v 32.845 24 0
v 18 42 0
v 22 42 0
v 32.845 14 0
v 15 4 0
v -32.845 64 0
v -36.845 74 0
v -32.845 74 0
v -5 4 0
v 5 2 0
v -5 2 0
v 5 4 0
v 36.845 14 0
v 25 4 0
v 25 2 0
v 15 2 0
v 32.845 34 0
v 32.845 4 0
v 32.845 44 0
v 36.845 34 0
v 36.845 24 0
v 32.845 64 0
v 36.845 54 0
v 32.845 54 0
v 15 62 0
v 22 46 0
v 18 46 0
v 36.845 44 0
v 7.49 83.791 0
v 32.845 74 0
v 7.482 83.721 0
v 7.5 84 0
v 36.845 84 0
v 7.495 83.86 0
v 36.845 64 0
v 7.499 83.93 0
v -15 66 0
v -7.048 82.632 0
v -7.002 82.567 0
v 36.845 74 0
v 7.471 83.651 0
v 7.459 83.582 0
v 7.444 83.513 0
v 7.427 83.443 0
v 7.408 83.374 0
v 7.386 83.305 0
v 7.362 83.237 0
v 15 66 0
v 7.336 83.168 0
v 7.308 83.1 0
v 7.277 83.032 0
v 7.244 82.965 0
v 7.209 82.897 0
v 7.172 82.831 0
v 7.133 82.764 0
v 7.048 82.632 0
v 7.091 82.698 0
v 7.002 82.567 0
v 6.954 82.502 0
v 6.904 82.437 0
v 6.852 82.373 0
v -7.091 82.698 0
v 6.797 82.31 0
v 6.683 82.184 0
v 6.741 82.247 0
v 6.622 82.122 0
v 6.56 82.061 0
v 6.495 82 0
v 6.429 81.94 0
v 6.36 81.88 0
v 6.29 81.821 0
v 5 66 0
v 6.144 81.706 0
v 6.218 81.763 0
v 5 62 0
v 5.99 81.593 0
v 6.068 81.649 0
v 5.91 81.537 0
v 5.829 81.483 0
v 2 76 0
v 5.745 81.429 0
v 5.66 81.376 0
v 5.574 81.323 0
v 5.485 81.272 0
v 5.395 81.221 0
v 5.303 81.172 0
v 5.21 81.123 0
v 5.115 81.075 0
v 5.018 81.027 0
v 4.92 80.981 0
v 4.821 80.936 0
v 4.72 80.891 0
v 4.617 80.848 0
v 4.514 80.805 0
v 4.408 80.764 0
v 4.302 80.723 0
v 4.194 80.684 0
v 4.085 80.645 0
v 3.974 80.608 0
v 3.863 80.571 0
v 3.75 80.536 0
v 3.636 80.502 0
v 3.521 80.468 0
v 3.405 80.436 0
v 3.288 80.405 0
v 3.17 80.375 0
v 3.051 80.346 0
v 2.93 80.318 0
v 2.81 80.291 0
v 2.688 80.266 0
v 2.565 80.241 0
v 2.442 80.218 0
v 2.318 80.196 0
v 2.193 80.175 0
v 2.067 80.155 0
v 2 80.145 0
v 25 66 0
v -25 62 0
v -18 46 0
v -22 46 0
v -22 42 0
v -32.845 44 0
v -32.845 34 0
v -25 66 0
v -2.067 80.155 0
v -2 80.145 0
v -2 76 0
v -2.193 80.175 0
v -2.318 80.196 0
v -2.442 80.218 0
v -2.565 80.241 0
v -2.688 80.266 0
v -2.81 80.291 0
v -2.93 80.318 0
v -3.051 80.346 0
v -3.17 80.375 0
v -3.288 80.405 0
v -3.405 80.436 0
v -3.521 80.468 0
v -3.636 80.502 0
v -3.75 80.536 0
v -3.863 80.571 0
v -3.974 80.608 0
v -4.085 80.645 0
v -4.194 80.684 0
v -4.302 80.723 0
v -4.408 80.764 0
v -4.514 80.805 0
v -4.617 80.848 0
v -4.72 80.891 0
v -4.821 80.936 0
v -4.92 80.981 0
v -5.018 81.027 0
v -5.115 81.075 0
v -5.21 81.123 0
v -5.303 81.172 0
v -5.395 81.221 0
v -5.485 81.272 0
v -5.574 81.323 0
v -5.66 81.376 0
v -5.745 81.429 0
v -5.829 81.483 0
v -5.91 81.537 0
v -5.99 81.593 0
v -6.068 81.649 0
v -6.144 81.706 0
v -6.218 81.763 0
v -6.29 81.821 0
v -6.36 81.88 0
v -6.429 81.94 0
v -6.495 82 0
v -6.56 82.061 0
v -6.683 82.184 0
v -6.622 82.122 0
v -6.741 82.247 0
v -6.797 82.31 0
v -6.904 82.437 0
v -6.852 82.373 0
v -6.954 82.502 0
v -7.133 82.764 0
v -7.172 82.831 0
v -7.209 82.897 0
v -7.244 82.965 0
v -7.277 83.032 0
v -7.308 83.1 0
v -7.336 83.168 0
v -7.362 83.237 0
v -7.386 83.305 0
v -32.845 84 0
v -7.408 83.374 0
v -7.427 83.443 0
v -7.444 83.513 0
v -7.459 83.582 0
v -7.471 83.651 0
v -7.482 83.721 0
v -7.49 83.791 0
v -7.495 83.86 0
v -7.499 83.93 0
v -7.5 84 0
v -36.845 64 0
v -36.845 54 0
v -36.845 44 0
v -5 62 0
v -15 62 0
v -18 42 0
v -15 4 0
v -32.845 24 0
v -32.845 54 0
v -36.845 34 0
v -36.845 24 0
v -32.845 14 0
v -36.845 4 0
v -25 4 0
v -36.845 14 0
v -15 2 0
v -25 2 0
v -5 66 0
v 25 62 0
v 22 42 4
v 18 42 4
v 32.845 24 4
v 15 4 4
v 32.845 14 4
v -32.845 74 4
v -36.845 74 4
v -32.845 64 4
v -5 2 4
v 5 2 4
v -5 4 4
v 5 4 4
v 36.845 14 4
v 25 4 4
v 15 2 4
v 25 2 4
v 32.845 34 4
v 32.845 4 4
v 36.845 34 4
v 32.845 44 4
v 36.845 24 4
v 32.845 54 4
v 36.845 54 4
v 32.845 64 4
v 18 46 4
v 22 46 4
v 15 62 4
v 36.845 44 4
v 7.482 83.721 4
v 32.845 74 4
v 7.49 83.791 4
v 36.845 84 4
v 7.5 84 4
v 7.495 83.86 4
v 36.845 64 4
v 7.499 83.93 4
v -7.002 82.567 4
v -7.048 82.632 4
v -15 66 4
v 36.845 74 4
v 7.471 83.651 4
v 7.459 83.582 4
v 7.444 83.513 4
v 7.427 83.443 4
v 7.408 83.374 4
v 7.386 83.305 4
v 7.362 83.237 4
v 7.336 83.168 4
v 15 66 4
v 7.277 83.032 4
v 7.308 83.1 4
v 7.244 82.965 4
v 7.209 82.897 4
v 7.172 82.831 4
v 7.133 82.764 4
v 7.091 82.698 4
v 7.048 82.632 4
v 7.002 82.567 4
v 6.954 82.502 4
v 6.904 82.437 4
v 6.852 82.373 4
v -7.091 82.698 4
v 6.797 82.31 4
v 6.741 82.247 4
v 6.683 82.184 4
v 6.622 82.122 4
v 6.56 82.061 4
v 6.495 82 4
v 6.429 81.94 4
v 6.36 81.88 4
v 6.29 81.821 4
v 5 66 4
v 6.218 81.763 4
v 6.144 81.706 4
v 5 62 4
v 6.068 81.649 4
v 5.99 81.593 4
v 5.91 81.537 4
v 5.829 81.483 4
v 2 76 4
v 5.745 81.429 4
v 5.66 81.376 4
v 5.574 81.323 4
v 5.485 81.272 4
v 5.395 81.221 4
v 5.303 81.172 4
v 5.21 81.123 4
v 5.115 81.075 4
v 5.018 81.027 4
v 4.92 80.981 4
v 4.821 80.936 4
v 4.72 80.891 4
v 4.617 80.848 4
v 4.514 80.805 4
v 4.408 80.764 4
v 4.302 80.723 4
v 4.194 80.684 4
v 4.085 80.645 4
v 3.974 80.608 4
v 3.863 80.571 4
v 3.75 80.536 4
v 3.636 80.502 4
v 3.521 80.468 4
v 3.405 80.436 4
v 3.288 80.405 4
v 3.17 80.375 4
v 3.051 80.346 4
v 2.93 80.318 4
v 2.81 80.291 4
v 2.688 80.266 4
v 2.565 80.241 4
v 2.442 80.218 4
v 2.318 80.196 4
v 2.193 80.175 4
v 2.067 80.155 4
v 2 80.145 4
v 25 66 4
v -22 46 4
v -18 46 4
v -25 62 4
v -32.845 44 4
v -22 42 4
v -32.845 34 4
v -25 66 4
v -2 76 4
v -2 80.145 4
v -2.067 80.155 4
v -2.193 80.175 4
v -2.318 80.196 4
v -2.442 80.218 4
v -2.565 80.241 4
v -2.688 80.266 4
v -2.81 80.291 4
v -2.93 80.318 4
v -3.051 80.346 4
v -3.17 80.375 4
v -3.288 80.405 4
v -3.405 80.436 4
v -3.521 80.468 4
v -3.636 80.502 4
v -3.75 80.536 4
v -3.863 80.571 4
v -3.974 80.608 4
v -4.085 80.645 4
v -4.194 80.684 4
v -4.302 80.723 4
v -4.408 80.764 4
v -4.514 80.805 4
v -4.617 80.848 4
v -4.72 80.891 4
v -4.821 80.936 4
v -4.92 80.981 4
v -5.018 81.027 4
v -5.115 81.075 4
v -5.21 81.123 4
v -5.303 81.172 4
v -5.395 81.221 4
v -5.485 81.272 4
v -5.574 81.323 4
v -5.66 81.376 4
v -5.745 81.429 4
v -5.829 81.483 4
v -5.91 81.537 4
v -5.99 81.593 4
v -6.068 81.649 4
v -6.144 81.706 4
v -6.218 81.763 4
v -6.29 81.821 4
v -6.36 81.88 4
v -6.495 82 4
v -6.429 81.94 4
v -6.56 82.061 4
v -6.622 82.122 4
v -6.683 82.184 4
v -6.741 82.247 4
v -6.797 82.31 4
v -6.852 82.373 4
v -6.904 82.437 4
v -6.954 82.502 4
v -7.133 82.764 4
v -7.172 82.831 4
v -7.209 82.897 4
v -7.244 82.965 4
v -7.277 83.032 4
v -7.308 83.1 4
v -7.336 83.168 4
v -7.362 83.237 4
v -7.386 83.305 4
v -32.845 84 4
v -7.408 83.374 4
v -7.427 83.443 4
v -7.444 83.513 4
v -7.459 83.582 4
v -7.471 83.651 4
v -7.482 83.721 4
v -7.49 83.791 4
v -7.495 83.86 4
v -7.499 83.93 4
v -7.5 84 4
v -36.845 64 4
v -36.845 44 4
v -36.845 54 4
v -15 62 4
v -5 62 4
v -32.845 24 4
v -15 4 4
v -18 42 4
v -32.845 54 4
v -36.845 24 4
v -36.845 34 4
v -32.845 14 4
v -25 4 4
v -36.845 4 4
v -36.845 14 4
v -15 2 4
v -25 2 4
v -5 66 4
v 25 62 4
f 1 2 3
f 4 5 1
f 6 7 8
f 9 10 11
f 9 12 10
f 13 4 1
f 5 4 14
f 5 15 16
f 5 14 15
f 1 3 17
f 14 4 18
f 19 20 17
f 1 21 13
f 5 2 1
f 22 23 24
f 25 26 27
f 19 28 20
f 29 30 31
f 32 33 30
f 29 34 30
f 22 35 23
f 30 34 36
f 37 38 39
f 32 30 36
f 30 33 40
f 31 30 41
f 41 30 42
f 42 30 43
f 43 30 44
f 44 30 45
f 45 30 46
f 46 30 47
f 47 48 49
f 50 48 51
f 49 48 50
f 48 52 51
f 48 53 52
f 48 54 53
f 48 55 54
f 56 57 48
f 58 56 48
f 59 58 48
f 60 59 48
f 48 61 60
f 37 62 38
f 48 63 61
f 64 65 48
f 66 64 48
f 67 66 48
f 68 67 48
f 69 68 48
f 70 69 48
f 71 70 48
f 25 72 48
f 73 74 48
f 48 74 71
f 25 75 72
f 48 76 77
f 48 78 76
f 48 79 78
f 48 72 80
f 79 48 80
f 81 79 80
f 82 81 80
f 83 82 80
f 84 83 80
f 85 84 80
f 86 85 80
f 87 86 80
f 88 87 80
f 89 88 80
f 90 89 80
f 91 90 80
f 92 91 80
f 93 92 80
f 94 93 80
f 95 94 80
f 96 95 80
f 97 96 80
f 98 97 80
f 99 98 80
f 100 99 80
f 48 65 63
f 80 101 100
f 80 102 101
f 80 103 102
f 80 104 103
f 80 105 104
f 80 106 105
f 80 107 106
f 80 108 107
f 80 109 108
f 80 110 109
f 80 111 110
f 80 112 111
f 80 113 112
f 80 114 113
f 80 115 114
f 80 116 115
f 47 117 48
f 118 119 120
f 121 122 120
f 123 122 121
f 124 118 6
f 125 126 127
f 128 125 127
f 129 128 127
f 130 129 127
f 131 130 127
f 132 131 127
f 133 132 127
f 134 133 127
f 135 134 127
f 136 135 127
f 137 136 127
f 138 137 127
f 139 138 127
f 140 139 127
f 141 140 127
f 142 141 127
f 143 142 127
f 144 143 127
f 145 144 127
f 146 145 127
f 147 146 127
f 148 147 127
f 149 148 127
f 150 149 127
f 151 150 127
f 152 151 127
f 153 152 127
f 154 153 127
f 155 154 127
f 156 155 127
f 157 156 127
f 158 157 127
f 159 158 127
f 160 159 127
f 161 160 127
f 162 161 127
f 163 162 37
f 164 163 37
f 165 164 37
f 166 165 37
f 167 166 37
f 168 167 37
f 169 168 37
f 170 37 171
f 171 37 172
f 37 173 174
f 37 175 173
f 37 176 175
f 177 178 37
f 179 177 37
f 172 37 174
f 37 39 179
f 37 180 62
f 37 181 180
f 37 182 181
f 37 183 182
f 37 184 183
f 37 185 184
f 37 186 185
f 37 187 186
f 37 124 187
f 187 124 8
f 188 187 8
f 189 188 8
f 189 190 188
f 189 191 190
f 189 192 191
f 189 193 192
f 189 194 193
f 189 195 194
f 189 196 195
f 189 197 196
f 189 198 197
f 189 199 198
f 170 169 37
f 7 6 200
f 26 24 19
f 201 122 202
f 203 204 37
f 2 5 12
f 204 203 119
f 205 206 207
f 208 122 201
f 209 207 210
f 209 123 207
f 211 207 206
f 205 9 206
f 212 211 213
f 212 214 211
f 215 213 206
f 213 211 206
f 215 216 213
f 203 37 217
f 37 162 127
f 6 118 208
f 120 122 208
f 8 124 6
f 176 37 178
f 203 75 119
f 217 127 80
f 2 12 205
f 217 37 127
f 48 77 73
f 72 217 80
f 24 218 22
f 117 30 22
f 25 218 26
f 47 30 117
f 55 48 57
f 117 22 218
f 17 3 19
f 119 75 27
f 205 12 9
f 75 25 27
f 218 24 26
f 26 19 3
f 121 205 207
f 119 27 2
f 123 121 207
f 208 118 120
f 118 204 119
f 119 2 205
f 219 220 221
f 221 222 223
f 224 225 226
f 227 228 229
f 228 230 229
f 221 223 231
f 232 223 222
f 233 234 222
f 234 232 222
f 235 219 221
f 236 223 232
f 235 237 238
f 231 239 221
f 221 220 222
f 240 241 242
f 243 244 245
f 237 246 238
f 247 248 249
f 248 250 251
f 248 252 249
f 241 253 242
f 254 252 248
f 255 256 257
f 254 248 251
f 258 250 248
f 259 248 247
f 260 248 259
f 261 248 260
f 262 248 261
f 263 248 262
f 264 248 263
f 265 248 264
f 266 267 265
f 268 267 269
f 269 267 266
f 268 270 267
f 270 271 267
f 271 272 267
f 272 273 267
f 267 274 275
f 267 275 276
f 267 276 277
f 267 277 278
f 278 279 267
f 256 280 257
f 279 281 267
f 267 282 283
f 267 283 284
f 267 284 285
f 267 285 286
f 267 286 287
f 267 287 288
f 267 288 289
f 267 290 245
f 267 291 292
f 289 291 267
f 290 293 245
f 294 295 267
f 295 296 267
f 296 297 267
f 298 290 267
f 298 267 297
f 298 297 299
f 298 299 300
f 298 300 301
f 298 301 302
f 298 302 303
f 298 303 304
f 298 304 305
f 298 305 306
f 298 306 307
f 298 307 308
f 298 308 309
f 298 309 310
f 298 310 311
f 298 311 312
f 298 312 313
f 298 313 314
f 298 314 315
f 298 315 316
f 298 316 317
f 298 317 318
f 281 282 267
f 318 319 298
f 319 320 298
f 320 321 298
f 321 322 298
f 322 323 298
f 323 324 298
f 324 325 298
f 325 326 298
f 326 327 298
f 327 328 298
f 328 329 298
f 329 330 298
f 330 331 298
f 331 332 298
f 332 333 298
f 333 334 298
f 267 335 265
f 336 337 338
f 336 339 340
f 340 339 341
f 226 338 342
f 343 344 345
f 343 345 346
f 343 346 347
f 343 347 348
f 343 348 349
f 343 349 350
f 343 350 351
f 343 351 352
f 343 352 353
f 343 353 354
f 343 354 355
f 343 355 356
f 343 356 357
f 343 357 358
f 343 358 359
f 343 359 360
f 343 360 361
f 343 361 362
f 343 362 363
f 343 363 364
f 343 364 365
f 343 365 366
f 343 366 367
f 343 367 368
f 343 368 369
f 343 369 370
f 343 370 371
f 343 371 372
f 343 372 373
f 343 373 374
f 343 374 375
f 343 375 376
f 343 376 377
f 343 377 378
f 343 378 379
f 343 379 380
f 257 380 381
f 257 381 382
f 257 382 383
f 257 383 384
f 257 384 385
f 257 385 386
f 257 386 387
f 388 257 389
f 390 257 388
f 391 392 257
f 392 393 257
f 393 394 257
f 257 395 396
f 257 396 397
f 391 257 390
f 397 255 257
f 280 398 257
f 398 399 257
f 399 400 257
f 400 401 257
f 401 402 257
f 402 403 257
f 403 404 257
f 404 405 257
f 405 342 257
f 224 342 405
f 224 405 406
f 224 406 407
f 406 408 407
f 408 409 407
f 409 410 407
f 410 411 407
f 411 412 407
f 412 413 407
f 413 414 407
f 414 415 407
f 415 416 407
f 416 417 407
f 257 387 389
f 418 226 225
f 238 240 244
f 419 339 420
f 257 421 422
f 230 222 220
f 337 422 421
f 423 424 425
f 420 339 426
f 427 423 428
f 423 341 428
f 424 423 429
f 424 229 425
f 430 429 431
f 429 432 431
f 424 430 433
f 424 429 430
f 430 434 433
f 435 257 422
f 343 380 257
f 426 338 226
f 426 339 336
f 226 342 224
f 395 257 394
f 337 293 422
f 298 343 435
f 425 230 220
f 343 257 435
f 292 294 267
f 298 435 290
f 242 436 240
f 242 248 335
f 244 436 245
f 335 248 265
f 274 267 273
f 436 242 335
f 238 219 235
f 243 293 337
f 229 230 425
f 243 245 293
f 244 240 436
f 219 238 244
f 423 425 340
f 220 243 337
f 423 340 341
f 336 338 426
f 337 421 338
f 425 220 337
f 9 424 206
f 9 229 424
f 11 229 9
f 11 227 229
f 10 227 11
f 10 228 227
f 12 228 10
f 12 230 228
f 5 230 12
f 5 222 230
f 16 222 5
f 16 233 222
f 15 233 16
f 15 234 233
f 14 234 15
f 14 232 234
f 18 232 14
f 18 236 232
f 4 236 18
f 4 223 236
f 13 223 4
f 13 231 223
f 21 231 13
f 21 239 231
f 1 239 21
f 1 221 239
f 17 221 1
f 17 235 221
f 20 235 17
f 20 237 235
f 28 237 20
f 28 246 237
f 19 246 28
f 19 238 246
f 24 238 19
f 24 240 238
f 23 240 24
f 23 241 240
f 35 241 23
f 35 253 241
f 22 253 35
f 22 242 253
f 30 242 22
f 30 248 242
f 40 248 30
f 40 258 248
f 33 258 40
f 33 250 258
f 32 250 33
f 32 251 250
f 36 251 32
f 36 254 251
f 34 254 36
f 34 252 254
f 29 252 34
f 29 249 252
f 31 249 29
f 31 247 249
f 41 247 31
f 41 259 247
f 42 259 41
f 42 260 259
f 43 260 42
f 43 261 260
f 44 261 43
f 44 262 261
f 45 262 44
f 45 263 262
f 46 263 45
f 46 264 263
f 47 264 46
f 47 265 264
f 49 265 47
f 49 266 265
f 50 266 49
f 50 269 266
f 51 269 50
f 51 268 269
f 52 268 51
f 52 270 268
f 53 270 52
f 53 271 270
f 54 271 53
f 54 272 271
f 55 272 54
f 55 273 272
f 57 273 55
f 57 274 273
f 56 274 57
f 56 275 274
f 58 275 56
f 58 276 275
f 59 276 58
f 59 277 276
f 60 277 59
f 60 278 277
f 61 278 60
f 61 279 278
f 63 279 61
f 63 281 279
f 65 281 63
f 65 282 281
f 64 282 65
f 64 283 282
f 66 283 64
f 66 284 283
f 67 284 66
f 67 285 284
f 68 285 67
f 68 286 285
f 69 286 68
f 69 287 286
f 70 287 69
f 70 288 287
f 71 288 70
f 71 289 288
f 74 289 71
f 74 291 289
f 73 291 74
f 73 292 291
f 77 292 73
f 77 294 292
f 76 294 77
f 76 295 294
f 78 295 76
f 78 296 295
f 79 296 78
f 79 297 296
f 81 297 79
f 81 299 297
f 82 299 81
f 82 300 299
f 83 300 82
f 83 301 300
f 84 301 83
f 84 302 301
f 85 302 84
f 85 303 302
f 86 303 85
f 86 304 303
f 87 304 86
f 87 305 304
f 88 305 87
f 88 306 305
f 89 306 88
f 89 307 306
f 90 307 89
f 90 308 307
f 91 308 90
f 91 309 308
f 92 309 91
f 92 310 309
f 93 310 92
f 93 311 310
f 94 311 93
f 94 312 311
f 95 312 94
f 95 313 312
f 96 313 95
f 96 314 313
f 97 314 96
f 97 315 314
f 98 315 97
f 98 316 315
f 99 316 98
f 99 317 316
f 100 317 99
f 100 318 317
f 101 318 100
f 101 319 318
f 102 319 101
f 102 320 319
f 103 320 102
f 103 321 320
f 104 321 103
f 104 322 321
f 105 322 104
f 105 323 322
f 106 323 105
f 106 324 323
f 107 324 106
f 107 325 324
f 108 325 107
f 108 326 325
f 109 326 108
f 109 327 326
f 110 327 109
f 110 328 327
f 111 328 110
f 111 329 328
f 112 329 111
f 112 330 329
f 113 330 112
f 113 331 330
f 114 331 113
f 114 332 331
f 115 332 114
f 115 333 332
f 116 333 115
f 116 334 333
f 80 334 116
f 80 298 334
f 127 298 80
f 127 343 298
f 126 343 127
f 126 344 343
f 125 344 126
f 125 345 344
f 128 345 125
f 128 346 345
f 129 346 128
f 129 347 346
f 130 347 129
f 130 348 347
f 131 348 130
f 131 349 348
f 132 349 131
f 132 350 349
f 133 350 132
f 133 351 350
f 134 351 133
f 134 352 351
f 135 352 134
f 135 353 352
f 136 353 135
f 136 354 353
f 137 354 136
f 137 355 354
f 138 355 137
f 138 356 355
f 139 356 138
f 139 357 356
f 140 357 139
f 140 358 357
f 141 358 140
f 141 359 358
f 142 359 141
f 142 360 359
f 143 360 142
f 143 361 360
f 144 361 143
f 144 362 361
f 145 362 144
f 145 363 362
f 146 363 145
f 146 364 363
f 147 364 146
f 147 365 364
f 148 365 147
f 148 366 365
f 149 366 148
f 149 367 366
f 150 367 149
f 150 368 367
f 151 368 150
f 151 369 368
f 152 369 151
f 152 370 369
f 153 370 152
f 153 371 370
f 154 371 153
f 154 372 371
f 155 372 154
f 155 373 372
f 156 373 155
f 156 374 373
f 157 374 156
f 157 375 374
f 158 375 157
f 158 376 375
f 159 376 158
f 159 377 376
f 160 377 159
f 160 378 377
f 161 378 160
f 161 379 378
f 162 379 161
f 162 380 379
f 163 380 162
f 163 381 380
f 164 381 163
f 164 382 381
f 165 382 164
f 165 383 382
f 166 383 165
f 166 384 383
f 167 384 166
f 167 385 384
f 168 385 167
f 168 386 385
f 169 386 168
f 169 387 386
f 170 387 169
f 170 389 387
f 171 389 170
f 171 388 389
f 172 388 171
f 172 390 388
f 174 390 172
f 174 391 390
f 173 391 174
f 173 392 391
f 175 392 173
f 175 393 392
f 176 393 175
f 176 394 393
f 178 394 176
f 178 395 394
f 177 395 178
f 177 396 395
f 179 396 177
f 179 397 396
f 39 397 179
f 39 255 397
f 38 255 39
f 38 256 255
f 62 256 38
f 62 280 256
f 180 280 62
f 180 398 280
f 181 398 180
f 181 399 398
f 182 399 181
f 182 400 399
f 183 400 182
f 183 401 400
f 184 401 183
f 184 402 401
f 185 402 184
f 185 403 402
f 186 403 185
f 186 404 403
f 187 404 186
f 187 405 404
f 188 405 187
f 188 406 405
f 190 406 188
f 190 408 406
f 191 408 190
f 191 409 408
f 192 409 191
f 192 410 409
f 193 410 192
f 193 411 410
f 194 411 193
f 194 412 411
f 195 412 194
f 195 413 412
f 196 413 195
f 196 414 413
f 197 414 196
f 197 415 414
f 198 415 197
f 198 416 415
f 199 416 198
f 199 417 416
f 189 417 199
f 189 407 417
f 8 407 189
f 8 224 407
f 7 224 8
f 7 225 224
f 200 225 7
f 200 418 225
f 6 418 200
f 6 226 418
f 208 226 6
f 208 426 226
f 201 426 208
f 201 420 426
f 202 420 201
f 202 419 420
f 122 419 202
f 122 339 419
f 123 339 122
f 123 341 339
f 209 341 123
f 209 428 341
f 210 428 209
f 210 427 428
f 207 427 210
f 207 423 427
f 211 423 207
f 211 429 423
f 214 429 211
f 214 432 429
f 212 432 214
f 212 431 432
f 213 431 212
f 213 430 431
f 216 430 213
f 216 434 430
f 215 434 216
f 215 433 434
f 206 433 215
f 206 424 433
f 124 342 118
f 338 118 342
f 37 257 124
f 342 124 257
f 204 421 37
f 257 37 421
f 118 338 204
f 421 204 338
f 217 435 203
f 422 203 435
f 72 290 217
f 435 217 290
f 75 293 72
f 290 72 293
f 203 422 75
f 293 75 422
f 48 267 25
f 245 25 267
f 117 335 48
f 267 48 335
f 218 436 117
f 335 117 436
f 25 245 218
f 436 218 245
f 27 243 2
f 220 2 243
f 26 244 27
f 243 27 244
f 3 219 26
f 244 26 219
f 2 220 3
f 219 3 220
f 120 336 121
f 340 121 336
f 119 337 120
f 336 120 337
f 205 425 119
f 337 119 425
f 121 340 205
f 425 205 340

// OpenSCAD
/* 
 * Stackenlichten-Files I: The top plate
 *
 * kellertuer, 2017-02-19
 */

/*
 * Variables, all Data in mm
 */
wW = 4;    // Thickness/Width of wood
mW = 4;    //                 of a Magnet-Cube
fW = 2;    // Thickness of the front plastic plate
sL = 80;   // sidelength of a triangle
bD = 80;   // Depth of a box (depth w.r.t. frontview)
fC = 3;    // number of fingers in the triangle (odd)
fD = 4;    // number on fingers downwards (even)
eW = 15; //ellipseWidth (longer arc)
// don't change these values
nC = 2*fC+2; //number of Divisions, due to 2fC+1 segments anC one segment that split in the corners
nD = 2*fD;
shortenSide = wW/tan(60)+wW/sin(90);
// concat with shfted rotated versions... bottom left right

//Generate one side

translate([0,wW]) rotate(a=0,v=[1,0,0])
SLside();

module SLside() {
    linear_extrude(height=wW, twist=0)
    difference() {
    midFC = (fC + 1)/2;
    SidePointLine = concat(genSide(0,[0,0], shortenSide,shortenSide+wW,fW),
    genDepth(0,[sL/2-shortenSide/2-wW,0],[0,0],wW),
    [[sL/2-shortenSide/2,-bD],[-sL/2+shortenSide/2+wW,-bD]],
    -genDepth(0,[sL/2-shortenSide/2-wW,bD],[0,0],wW)   );
  rotate(a=180,v=[1,0,0])
  polygon(points=SidePointLine);
  // minus...
  translate([2*sL/nC,bD/2])
    square(size = [mW,mW], center = true);
  translate([-2*sL/nC,bD/2])
    square(size = [mW,mW], center = true);
  for (i = [1:fC]) {
    translate([-sL/2+2*i*sL/nC,3*bD/4])
      square([sL/nC,wW], center = true);
  };
    translate([0,bD,0]) scale([eW,2*wW])circle(d=1,$fn=360,center=true);
    translate([0,bD-wW]) square([wW,2*wW],center=true);
}}


/*
 * Helping Functions - Generate one side of the triangle recursion olé olé
 */
function genSide(a=0,v=[0,0],sLe=0,sRi=0,h=wW) = generateSide([rotM(a)*[-(sL-sLe)/2,0]+v],0,a,v,sLe,sRi,h);   
//Recursively generate fC toothes
function generateSide(pL,i,a,v,sLe,sRi,h) = (i==fC) ? concat(pL,[rotM(a)*[(sL-sRi)/2,0]+v])
    : generateSide(concat(pL,[
        rotM(a)*[-sL/2+(2*i+1.5)*sL/nC,0]+v, rotM(a)*[-sL/2+(2*i+1.5)*sL/nC,h]+v,
        rotM(a)*[-sL/2+(2*i+2.5)*sL/nC,h]+v, rotM(a)*[-sL/2+(2*i+2.5)*sL/nC,0]+v]),i+1,a,v,sLe,sRi,h);
function genDepth(a=0,v=[0,0],start=[0,0],h=wW) = generateDepth([start+v],0,a,v,h,start);
function generateDepth(pL,i,a,v,h,start) = (i==fD) ? pL
    : generateDepth(concat(pL,[
        rotM(a)*(start+[0,-(2*i+1)*bD/nD])+v, rotM(a)*(start+[h,-(2*i+1)*bD/nD])+v,
        rotM(a)*(start+[h,-(2*i+2)*bD/nD])+v, rotM(a)*(start+[0,-(2*i+2)*bD/nD])+v
        ]),i+1,a,v,h,start);
/*
 * Small Helpers
 */
function rotM(a) = [[cos(a),sin(a)],[-sin(a),cos(a)]];
